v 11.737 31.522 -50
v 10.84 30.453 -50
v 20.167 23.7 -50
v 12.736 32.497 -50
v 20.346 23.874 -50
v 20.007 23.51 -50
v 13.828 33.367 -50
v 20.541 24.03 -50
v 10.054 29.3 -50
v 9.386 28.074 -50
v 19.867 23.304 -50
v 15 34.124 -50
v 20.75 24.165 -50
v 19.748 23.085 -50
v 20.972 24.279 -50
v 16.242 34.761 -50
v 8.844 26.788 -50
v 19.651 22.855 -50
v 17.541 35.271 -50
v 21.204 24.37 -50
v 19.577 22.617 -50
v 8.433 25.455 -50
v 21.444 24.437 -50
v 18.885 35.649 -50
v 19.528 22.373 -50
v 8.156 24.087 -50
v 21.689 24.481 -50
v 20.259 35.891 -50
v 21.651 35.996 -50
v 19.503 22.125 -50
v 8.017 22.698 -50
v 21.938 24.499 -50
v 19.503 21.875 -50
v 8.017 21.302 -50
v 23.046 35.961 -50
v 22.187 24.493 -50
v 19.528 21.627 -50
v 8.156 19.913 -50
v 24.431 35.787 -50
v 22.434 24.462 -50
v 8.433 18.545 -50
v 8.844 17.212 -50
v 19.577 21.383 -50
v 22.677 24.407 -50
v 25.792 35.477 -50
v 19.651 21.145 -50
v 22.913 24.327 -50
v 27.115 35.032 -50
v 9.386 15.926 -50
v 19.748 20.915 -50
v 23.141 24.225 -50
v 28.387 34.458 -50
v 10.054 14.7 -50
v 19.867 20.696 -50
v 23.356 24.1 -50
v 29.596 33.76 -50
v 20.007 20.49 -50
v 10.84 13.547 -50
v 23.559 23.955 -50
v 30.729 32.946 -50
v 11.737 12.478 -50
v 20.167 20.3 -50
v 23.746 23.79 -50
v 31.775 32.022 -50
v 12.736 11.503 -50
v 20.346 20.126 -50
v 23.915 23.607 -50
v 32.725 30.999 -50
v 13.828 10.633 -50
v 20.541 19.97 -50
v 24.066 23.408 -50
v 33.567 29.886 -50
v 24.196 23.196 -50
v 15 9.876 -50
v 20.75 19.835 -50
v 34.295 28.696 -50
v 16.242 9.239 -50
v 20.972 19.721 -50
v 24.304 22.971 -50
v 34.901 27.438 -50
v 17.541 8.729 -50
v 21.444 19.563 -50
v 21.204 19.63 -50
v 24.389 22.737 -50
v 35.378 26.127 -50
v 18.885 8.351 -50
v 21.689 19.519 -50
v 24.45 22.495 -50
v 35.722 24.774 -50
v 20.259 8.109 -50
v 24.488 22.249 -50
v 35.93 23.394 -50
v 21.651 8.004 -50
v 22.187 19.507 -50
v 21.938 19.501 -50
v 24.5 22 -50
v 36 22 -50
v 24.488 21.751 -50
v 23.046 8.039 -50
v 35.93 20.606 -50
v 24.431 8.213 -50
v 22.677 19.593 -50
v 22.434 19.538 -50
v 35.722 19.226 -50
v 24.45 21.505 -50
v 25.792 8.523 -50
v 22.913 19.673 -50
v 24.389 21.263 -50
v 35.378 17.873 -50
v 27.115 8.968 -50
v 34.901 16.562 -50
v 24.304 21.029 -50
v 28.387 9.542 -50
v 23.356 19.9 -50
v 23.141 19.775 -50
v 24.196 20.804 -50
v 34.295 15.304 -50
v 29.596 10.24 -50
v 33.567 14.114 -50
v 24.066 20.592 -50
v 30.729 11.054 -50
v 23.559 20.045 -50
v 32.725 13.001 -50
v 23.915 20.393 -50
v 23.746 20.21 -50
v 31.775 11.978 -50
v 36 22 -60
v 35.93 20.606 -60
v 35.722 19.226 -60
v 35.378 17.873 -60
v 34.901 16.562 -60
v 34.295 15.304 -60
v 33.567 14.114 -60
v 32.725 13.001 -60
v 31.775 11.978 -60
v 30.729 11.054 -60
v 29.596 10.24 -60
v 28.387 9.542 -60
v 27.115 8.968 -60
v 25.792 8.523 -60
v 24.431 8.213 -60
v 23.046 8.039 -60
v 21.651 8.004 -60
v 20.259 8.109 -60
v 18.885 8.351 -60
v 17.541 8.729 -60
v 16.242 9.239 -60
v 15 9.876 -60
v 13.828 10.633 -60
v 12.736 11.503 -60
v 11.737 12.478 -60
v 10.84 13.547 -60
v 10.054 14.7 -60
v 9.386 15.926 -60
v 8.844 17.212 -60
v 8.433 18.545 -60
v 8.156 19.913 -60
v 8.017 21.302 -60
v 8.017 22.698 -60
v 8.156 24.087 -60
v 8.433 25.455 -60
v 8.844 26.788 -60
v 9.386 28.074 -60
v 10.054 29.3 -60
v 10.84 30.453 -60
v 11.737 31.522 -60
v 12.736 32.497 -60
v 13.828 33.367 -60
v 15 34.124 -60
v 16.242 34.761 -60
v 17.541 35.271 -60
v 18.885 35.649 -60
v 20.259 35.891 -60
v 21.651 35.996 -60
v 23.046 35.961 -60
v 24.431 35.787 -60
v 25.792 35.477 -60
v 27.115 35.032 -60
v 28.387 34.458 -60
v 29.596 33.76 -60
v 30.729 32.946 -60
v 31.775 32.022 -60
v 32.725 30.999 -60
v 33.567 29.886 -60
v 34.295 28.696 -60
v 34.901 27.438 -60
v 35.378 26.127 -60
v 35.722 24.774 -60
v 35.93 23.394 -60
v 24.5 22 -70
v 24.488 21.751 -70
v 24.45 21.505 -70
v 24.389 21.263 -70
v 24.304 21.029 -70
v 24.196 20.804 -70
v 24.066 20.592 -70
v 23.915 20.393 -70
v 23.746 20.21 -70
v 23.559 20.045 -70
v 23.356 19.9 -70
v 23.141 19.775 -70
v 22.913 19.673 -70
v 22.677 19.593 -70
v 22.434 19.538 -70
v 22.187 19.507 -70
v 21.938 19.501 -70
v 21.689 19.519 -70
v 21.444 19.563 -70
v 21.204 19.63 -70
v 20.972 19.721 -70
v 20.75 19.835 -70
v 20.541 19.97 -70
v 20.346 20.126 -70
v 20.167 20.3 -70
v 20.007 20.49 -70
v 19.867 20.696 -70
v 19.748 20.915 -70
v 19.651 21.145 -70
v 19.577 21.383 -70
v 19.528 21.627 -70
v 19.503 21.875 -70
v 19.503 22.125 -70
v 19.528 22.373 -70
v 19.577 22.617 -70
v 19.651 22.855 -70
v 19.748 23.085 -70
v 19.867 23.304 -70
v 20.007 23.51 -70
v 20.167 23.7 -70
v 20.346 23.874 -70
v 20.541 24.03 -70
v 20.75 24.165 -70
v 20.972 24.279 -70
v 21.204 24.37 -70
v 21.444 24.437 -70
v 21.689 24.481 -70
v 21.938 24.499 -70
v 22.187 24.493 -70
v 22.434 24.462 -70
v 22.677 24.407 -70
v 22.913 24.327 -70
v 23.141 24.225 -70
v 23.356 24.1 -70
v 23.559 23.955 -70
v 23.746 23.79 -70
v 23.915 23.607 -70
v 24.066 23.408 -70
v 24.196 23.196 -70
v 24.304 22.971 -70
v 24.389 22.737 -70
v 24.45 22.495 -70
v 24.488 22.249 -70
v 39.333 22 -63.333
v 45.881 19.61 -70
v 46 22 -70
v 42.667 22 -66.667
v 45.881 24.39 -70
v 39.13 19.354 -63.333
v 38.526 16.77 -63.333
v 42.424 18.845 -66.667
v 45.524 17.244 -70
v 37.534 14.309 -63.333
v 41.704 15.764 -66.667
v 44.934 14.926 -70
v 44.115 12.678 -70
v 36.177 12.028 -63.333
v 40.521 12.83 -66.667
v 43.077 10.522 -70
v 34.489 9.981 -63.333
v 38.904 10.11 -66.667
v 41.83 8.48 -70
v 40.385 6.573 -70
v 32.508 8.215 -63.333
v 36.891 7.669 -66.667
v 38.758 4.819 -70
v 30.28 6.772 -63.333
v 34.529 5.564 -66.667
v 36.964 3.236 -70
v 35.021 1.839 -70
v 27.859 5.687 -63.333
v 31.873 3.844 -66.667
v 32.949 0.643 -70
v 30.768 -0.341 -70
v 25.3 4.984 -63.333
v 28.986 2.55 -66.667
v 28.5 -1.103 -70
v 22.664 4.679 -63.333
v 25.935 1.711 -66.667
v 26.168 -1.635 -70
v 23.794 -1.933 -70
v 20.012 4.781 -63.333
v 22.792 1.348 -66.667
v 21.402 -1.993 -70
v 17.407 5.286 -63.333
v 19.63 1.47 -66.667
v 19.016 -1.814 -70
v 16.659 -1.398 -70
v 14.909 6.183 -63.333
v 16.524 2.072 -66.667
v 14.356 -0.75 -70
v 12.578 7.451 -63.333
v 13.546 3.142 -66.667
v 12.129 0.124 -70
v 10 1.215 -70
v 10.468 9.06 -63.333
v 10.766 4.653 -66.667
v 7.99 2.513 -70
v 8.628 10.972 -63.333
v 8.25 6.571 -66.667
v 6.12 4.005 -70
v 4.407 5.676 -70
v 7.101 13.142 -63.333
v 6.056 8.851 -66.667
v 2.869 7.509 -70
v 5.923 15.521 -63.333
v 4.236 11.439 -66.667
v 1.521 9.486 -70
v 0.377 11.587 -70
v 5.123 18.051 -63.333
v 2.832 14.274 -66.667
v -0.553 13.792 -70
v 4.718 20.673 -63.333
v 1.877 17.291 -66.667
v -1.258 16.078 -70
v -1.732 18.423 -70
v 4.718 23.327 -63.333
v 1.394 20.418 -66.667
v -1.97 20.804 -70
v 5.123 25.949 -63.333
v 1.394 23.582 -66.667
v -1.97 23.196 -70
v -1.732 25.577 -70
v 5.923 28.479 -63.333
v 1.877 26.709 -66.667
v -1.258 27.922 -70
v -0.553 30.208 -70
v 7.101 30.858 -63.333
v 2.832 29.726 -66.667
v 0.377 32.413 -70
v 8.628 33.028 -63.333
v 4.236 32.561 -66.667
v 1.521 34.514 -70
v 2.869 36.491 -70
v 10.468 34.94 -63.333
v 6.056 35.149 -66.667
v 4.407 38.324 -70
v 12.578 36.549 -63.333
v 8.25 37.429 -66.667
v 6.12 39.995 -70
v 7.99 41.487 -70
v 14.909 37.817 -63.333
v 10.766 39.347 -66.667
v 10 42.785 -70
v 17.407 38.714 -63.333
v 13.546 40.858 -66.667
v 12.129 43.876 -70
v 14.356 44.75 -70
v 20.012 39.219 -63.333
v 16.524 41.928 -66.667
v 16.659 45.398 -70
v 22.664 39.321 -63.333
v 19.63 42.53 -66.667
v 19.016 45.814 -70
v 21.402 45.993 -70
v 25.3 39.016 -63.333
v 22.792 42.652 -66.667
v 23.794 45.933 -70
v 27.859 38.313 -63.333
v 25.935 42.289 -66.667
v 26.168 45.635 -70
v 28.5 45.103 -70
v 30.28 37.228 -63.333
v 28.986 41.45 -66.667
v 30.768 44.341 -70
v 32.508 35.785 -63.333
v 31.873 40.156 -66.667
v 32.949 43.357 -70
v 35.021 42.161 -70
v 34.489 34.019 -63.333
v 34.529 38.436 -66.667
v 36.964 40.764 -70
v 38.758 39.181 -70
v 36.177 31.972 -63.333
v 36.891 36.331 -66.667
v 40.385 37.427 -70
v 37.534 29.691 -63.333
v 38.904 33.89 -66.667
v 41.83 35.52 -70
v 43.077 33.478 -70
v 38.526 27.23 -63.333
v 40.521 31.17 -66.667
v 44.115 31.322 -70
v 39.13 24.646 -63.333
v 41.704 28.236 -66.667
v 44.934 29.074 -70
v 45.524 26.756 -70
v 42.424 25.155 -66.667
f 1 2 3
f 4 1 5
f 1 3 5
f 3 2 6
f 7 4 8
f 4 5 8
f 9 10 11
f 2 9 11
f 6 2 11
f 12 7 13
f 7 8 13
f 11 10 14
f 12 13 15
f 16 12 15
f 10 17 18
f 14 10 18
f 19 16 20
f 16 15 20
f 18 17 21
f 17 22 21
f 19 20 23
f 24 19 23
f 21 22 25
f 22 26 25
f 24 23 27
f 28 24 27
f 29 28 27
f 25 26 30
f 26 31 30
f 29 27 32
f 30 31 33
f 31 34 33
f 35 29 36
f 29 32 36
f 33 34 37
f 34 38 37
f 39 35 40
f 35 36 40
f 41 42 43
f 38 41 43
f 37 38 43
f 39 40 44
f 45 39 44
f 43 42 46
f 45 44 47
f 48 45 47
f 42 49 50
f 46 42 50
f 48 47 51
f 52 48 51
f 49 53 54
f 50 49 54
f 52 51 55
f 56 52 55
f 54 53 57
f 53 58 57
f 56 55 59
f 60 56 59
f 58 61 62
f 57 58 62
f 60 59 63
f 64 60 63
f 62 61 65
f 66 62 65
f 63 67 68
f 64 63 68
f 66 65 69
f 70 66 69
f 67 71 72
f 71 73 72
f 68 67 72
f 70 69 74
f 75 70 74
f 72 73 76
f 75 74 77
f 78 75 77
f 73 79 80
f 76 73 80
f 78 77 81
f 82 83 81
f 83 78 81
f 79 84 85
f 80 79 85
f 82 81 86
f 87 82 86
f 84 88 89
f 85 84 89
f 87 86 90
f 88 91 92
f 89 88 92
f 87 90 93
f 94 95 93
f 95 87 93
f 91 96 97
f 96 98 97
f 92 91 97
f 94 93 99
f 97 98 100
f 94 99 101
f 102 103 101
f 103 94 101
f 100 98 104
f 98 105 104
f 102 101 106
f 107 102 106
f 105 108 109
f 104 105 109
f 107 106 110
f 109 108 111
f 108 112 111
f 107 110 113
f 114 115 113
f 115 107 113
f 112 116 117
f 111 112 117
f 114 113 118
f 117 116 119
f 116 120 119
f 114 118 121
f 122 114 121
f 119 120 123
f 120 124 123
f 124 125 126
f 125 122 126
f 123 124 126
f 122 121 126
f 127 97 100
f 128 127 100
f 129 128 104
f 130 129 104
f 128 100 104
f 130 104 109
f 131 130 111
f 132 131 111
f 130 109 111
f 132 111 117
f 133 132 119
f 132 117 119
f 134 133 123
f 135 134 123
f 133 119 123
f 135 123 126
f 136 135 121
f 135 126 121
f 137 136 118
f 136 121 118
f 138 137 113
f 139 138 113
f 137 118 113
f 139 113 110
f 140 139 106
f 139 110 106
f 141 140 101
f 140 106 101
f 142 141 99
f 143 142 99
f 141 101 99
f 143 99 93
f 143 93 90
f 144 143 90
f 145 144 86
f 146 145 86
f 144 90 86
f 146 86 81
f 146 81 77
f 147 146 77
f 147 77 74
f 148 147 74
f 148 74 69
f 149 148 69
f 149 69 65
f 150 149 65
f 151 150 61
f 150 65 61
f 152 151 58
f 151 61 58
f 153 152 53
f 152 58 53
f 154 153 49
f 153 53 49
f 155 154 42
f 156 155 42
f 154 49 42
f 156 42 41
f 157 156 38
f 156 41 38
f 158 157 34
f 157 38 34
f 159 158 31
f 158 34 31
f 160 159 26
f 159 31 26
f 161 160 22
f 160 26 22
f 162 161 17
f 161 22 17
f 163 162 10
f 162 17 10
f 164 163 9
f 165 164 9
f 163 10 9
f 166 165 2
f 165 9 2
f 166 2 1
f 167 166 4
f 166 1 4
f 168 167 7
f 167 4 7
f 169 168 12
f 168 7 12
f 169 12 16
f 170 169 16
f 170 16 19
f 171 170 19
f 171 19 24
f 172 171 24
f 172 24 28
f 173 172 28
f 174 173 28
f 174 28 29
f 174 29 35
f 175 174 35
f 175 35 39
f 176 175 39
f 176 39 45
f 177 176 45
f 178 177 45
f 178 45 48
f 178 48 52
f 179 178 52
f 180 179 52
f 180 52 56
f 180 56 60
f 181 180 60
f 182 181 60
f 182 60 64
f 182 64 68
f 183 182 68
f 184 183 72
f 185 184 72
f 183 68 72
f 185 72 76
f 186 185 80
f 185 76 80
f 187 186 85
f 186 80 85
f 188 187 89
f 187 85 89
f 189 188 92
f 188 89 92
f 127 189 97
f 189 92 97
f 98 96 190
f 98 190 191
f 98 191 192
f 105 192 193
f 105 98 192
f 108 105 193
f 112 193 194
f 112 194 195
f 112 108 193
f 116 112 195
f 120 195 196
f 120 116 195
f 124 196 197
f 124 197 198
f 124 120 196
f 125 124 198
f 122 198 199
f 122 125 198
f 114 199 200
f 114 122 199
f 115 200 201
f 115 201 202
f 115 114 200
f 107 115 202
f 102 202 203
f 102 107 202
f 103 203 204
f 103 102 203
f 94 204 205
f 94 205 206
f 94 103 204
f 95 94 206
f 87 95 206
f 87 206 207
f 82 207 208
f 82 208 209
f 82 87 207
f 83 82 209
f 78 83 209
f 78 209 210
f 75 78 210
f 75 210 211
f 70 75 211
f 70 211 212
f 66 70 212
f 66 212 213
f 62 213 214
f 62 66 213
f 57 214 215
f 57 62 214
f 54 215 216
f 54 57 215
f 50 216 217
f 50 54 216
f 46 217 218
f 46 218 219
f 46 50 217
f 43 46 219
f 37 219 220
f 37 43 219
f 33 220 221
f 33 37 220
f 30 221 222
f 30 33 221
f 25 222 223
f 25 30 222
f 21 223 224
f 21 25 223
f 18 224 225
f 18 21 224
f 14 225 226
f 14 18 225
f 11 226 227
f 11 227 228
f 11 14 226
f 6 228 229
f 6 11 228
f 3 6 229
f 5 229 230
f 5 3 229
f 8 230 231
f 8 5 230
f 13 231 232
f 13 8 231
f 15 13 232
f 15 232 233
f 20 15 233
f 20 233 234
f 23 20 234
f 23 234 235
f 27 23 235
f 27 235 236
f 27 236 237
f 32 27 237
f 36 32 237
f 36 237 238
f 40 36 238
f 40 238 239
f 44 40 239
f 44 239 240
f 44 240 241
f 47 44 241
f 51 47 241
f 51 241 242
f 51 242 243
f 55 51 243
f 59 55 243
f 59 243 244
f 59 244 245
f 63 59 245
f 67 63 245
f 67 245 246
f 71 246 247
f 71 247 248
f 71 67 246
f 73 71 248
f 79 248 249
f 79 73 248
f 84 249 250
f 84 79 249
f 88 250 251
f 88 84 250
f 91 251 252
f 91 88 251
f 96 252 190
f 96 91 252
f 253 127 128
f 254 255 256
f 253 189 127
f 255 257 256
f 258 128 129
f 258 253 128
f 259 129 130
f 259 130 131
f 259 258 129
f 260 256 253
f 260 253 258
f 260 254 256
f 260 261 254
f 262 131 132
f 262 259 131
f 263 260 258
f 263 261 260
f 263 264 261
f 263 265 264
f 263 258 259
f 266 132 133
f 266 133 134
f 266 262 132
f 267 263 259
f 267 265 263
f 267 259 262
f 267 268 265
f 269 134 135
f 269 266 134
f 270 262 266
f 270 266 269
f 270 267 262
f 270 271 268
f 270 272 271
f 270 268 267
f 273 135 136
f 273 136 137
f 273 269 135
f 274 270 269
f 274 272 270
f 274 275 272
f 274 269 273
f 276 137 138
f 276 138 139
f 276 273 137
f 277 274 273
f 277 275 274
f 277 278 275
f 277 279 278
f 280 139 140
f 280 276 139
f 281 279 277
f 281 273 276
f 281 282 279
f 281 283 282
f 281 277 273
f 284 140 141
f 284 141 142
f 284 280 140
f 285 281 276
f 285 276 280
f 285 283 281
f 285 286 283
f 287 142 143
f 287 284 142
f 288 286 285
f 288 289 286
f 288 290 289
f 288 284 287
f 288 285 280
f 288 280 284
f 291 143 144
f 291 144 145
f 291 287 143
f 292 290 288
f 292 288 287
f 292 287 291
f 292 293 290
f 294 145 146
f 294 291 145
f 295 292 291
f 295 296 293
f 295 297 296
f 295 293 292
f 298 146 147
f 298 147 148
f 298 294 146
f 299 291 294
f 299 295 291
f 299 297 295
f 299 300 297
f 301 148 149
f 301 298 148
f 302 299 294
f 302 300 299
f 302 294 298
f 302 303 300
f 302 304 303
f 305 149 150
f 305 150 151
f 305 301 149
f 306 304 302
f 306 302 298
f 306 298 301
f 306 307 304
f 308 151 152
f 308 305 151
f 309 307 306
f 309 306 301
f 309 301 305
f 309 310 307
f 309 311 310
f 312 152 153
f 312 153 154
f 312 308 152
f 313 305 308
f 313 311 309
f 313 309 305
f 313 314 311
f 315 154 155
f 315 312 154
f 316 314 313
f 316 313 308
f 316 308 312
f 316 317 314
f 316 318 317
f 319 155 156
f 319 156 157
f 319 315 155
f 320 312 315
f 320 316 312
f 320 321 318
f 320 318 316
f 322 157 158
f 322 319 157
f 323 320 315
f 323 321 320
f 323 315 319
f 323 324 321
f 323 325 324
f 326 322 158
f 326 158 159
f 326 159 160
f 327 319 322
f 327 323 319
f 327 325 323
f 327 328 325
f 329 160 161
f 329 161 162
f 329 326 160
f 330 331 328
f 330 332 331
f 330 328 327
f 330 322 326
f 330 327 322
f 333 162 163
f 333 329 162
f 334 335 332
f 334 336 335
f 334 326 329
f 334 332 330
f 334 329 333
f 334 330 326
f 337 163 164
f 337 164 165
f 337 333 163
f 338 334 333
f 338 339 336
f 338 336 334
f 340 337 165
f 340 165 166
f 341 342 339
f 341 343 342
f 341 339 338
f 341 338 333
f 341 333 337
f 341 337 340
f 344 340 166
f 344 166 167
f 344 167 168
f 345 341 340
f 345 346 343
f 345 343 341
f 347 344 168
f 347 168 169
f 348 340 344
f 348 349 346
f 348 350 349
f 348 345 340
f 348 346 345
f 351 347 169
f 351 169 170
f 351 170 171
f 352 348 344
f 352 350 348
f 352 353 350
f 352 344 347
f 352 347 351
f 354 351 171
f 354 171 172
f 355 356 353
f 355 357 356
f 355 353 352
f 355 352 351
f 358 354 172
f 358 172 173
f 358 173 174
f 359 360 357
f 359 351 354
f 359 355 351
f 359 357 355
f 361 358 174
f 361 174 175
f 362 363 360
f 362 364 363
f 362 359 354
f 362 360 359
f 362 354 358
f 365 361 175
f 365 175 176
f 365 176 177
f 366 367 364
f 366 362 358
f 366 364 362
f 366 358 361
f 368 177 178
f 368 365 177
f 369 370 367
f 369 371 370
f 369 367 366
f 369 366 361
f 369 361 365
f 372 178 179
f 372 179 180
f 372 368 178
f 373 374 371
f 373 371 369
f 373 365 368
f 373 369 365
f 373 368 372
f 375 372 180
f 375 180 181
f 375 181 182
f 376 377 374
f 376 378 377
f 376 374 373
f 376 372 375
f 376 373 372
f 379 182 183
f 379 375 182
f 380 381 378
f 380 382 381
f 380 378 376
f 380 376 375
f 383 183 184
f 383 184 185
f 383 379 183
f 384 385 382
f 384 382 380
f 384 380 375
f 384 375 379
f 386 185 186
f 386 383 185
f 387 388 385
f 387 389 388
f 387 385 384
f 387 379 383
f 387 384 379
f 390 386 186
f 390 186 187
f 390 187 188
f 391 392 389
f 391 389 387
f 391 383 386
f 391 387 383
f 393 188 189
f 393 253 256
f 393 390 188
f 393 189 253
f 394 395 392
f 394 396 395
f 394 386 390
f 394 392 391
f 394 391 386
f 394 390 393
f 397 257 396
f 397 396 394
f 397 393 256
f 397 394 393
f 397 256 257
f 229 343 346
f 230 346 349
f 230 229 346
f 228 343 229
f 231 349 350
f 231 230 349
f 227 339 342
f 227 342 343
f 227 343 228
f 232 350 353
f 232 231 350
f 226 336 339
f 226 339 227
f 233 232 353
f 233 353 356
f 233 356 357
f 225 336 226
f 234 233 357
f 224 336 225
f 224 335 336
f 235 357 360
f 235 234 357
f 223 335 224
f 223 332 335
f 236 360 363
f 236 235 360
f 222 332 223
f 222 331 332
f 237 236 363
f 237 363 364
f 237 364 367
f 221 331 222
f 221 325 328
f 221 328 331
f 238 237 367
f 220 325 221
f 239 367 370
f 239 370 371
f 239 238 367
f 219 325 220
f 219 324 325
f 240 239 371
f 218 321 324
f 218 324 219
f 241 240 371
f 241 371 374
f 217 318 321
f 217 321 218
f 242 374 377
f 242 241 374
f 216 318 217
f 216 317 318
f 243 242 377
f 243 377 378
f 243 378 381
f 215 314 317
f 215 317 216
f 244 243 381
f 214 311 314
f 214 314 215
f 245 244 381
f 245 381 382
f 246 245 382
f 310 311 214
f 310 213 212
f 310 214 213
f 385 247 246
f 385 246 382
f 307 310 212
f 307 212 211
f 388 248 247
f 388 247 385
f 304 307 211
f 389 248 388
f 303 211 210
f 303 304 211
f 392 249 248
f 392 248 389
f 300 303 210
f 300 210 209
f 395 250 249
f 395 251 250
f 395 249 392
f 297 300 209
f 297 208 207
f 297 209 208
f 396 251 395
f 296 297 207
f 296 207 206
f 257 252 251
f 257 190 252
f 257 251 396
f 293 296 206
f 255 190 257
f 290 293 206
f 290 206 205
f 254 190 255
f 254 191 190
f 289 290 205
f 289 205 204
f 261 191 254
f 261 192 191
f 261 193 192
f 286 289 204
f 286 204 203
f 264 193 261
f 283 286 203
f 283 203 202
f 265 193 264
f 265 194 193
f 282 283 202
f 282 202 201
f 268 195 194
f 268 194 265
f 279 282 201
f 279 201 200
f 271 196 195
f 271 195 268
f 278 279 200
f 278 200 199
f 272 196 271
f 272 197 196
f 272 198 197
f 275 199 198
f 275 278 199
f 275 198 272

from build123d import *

# Parameters (mm, degrees)
CYLINDER004_R       = 2.5
CYLINDER004_DEPTH   = 20
CYLINDER003_R       = 14
CYLINDER003_DEPTH   = 10
CUT_PLACEMENT_ANGLE = 180


with BuildPart() as cylinder001:
    # Cylinder004 → Cylinder004 (new body)
    with BuildSketch(Plane.XY):
        Circle(CYLINDER004_R)
    extrude(amount=CYLINDER004_DEPTH)


with BuildPart() as cone:
    # Cone → Cone (revolve)
    with BuildSketch(Plane(origin=(0, 0, 10), x_dir=(1, 0, 0), z_dir=(0, -1, 0))):
        Polygon((0, 0), (14, 0), (24, 10), (0, 10), align=None)
    revolve(axis=Axis((0, 0, 10), (0, 0, 1)))


with BuildPart() as chinafoot:
    # Cylinder003 → Cylinder003 (new body)
    with BuildSketch(Plane.XY):
        Circle(CYLINDER003_R)
    extrude(amount=CYLINDER003_DEPTH)

    # Fusion004: union Cone
    add(cone.part)

    # Cut: cut Cylinder001
    add(cylinder001.part, mode=Mode.SUBTRACT)


with BuildPart() as chinafoot_1:
    # Cut placement: moved
    add(chinafoot.part.moved(Location((22, 22, -50))).rotate(Axis((22, 22, -50), (1, 0, 0)), CUT_PLACEMENT_ANGLE))


solid = chinafoot_1.part
